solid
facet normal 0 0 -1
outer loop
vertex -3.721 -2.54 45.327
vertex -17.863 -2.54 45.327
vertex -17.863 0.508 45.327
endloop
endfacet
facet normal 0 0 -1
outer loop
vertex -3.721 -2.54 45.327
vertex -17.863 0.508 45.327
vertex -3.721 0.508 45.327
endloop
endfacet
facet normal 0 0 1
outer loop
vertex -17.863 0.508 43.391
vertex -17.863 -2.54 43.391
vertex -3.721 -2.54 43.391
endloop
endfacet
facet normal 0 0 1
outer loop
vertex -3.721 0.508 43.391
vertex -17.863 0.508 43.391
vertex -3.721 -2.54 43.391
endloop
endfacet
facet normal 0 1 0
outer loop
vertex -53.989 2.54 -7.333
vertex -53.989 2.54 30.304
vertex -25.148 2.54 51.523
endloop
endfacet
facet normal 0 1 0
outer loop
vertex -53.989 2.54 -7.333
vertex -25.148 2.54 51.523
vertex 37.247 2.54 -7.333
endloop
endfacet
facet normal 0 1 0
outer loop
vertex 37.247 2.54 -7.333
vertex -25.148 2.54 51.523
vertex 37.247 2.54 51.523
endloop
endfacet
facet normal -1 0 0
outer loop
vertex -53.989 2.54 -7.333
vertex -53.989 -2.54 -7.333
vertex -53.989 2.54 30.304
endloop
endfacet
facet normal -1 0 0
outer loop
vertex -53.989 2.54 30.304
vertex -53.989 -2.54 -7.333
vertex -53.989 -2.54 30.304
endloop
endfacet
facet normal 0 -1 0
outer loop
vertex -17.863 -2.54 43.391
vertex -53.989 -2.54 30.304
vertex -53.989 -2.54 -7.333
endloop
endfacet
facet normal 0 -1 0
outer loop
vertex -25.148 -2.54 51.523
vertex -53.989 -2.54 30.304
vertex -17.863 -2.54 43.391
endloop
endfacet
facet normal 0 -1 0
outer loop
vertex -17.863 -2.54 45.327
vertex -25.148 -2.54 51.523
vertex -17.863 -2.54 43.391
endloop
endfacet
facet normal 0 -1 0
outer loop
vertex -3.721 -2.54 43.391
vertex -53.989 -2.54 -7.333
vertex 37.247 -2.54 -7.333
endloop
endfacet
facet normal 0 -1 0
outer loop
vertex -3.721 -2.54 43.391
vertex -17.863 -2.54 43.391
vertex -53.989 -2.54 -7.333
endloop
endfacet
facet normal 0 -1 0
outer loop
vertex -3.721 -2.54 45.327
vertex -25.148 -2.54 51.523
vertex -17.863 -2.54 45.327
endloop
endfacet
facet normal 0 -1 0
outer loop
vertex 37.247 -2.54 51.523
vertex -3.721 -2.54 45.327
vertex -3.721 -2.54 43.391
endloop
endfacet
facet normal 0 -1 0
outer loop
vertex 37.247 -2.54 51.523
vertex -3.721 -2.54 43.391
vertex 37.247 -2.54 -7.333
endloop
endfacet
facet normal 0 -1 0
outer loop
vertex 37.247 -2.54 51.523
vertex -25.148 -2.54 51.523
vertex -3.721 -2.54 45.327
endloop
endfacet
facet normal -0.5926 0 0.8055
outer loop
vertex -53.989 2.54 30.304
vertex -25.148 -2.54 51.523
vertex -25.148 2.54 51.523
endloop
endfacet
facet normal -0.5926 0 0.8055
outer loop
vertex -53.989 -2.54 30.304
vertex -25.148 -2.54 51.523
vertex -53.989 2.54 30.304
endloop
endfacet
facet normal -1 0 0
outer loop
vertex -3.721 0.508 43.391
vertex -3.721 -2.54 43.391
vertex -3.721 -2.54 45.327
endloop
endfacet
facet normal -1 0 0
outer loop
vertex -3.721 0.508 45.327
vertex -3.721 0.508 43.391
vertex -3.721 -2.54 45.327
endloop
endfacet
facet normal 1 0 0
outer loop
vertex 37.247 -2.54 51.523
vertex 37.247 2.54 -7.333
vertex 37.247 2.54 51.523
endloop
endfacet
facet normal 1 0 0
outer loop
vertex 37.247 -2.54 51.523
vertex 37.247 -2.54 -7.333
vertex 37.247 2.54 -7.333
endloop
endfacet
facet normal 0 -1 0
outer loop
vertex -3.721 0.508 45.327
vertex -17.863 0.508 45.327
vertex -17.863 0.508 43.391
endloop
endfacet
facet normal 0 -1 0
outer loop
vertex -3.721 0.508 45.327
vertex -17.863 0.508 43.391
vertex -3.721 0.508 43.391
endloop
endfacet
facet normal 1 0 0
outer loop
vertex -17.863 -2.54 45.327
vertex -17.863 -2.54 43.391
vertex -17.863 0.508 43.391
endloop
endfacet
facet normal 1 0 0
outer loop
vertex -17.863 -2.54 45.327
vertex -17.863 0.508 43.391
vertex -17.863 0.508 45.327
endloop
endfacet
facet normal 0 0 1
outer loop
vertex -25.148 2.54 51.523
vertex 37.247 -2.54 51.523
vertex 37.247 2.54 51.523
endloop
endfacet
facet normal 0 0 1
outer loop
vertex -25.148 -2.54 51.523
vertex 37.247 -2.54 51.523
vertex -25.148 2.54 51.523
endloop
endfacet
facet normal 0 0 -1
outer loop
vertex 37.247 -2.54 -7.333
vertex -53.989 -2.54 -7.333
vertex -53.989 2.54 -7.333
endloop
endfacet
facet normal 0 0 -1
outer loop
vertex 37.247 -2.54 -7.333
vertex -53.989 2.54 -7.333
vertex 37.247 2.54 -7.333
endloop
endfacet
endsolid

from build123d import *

# Parameters (mm, degrees)
F0_W          = 58.9205864817
F0_H          = 37.636497058
F0_W_2        = 32.3154758662
F1_DEPTH      = 2.54
F1_DEPTH_BACK = 2.54
F2_W          = 3.5040900111
F2_H          = 3.5040876828
F2_W_2        = 3.5040881485
F3_DEPTH      = 3.556
F4_W          = 9.6756285056
F4_H          = 1.0419934988
F5_DEPTH      = 1.524
F6_W          = 14.1413027886
F6_H          = 1.9351281226
F7_DEPTH      = 3.048


with BuildPart() as f1:
    # F0 (on Front) → F1 (new body, two sides)
    with BuildSketch(Plane.XZ) as f1_sk:
        Polygon((-25.1475647092, 51.5233650804), (-53.9889074862, 30.3038693964), (4.9316789955, 30.3038693964), align=None)
        Polygon((-25.1475647092, 51.5233650804), (4.9316789955, 30.3038693964), (37.2471548617, 30.3038693964), (37.2471548617, 51.5233650804), align=None)
        with Locations((-24.5286142454, 11.4856208675)):
            Rectangle(F0_W, F0_H)
        with Locations((21.0894169286, 11.4856208675)):
            Rectangle(F0_W_2, F0_H)
    extrude(amount=F1_DEPTH)
    extrude(f1_sk.sketch, amount=-F1_DEPTH_BACK)

    # F2 (on face) → F3 (cut)
    with BuildSketch(Plane(origin=(0, 0, -7.3326276615), x_dir=(1, 0, 0), z_dir=(0, 0, -1))):
        with Locations((-47.6945266128, 5.5805838201)):
            Rectangle(F2_W, F2_H)
        with Locations((27.3189069703, 5.5805838201)):
            Rectangle(F2_W_2, F2_H)
    extrude(amount=-F3_DEPTH, mode=Mode.SUBTRACT)

    # F4 (on face) → F5 (join)
    with BuildSketch(Plane.XZ.offset(2.54)):
        with Locations((-4.8378142528, 45.4010255635)):
            Rectangle(F4_W, F4_H)
    extrude(amount=-F5_DEPTH)

    # F6 (on face) → F7 (cut)
    with BuildSketch(Plane.XZ.offset(2.54)):
        with Locations((-10.7920466689, 44.3590339273)):
            Rectangle(F6_W, F6_H)
    extrude(amount=-F7_DEPTH, mode=Mode.SUBTRACT)


solid = f1.part
